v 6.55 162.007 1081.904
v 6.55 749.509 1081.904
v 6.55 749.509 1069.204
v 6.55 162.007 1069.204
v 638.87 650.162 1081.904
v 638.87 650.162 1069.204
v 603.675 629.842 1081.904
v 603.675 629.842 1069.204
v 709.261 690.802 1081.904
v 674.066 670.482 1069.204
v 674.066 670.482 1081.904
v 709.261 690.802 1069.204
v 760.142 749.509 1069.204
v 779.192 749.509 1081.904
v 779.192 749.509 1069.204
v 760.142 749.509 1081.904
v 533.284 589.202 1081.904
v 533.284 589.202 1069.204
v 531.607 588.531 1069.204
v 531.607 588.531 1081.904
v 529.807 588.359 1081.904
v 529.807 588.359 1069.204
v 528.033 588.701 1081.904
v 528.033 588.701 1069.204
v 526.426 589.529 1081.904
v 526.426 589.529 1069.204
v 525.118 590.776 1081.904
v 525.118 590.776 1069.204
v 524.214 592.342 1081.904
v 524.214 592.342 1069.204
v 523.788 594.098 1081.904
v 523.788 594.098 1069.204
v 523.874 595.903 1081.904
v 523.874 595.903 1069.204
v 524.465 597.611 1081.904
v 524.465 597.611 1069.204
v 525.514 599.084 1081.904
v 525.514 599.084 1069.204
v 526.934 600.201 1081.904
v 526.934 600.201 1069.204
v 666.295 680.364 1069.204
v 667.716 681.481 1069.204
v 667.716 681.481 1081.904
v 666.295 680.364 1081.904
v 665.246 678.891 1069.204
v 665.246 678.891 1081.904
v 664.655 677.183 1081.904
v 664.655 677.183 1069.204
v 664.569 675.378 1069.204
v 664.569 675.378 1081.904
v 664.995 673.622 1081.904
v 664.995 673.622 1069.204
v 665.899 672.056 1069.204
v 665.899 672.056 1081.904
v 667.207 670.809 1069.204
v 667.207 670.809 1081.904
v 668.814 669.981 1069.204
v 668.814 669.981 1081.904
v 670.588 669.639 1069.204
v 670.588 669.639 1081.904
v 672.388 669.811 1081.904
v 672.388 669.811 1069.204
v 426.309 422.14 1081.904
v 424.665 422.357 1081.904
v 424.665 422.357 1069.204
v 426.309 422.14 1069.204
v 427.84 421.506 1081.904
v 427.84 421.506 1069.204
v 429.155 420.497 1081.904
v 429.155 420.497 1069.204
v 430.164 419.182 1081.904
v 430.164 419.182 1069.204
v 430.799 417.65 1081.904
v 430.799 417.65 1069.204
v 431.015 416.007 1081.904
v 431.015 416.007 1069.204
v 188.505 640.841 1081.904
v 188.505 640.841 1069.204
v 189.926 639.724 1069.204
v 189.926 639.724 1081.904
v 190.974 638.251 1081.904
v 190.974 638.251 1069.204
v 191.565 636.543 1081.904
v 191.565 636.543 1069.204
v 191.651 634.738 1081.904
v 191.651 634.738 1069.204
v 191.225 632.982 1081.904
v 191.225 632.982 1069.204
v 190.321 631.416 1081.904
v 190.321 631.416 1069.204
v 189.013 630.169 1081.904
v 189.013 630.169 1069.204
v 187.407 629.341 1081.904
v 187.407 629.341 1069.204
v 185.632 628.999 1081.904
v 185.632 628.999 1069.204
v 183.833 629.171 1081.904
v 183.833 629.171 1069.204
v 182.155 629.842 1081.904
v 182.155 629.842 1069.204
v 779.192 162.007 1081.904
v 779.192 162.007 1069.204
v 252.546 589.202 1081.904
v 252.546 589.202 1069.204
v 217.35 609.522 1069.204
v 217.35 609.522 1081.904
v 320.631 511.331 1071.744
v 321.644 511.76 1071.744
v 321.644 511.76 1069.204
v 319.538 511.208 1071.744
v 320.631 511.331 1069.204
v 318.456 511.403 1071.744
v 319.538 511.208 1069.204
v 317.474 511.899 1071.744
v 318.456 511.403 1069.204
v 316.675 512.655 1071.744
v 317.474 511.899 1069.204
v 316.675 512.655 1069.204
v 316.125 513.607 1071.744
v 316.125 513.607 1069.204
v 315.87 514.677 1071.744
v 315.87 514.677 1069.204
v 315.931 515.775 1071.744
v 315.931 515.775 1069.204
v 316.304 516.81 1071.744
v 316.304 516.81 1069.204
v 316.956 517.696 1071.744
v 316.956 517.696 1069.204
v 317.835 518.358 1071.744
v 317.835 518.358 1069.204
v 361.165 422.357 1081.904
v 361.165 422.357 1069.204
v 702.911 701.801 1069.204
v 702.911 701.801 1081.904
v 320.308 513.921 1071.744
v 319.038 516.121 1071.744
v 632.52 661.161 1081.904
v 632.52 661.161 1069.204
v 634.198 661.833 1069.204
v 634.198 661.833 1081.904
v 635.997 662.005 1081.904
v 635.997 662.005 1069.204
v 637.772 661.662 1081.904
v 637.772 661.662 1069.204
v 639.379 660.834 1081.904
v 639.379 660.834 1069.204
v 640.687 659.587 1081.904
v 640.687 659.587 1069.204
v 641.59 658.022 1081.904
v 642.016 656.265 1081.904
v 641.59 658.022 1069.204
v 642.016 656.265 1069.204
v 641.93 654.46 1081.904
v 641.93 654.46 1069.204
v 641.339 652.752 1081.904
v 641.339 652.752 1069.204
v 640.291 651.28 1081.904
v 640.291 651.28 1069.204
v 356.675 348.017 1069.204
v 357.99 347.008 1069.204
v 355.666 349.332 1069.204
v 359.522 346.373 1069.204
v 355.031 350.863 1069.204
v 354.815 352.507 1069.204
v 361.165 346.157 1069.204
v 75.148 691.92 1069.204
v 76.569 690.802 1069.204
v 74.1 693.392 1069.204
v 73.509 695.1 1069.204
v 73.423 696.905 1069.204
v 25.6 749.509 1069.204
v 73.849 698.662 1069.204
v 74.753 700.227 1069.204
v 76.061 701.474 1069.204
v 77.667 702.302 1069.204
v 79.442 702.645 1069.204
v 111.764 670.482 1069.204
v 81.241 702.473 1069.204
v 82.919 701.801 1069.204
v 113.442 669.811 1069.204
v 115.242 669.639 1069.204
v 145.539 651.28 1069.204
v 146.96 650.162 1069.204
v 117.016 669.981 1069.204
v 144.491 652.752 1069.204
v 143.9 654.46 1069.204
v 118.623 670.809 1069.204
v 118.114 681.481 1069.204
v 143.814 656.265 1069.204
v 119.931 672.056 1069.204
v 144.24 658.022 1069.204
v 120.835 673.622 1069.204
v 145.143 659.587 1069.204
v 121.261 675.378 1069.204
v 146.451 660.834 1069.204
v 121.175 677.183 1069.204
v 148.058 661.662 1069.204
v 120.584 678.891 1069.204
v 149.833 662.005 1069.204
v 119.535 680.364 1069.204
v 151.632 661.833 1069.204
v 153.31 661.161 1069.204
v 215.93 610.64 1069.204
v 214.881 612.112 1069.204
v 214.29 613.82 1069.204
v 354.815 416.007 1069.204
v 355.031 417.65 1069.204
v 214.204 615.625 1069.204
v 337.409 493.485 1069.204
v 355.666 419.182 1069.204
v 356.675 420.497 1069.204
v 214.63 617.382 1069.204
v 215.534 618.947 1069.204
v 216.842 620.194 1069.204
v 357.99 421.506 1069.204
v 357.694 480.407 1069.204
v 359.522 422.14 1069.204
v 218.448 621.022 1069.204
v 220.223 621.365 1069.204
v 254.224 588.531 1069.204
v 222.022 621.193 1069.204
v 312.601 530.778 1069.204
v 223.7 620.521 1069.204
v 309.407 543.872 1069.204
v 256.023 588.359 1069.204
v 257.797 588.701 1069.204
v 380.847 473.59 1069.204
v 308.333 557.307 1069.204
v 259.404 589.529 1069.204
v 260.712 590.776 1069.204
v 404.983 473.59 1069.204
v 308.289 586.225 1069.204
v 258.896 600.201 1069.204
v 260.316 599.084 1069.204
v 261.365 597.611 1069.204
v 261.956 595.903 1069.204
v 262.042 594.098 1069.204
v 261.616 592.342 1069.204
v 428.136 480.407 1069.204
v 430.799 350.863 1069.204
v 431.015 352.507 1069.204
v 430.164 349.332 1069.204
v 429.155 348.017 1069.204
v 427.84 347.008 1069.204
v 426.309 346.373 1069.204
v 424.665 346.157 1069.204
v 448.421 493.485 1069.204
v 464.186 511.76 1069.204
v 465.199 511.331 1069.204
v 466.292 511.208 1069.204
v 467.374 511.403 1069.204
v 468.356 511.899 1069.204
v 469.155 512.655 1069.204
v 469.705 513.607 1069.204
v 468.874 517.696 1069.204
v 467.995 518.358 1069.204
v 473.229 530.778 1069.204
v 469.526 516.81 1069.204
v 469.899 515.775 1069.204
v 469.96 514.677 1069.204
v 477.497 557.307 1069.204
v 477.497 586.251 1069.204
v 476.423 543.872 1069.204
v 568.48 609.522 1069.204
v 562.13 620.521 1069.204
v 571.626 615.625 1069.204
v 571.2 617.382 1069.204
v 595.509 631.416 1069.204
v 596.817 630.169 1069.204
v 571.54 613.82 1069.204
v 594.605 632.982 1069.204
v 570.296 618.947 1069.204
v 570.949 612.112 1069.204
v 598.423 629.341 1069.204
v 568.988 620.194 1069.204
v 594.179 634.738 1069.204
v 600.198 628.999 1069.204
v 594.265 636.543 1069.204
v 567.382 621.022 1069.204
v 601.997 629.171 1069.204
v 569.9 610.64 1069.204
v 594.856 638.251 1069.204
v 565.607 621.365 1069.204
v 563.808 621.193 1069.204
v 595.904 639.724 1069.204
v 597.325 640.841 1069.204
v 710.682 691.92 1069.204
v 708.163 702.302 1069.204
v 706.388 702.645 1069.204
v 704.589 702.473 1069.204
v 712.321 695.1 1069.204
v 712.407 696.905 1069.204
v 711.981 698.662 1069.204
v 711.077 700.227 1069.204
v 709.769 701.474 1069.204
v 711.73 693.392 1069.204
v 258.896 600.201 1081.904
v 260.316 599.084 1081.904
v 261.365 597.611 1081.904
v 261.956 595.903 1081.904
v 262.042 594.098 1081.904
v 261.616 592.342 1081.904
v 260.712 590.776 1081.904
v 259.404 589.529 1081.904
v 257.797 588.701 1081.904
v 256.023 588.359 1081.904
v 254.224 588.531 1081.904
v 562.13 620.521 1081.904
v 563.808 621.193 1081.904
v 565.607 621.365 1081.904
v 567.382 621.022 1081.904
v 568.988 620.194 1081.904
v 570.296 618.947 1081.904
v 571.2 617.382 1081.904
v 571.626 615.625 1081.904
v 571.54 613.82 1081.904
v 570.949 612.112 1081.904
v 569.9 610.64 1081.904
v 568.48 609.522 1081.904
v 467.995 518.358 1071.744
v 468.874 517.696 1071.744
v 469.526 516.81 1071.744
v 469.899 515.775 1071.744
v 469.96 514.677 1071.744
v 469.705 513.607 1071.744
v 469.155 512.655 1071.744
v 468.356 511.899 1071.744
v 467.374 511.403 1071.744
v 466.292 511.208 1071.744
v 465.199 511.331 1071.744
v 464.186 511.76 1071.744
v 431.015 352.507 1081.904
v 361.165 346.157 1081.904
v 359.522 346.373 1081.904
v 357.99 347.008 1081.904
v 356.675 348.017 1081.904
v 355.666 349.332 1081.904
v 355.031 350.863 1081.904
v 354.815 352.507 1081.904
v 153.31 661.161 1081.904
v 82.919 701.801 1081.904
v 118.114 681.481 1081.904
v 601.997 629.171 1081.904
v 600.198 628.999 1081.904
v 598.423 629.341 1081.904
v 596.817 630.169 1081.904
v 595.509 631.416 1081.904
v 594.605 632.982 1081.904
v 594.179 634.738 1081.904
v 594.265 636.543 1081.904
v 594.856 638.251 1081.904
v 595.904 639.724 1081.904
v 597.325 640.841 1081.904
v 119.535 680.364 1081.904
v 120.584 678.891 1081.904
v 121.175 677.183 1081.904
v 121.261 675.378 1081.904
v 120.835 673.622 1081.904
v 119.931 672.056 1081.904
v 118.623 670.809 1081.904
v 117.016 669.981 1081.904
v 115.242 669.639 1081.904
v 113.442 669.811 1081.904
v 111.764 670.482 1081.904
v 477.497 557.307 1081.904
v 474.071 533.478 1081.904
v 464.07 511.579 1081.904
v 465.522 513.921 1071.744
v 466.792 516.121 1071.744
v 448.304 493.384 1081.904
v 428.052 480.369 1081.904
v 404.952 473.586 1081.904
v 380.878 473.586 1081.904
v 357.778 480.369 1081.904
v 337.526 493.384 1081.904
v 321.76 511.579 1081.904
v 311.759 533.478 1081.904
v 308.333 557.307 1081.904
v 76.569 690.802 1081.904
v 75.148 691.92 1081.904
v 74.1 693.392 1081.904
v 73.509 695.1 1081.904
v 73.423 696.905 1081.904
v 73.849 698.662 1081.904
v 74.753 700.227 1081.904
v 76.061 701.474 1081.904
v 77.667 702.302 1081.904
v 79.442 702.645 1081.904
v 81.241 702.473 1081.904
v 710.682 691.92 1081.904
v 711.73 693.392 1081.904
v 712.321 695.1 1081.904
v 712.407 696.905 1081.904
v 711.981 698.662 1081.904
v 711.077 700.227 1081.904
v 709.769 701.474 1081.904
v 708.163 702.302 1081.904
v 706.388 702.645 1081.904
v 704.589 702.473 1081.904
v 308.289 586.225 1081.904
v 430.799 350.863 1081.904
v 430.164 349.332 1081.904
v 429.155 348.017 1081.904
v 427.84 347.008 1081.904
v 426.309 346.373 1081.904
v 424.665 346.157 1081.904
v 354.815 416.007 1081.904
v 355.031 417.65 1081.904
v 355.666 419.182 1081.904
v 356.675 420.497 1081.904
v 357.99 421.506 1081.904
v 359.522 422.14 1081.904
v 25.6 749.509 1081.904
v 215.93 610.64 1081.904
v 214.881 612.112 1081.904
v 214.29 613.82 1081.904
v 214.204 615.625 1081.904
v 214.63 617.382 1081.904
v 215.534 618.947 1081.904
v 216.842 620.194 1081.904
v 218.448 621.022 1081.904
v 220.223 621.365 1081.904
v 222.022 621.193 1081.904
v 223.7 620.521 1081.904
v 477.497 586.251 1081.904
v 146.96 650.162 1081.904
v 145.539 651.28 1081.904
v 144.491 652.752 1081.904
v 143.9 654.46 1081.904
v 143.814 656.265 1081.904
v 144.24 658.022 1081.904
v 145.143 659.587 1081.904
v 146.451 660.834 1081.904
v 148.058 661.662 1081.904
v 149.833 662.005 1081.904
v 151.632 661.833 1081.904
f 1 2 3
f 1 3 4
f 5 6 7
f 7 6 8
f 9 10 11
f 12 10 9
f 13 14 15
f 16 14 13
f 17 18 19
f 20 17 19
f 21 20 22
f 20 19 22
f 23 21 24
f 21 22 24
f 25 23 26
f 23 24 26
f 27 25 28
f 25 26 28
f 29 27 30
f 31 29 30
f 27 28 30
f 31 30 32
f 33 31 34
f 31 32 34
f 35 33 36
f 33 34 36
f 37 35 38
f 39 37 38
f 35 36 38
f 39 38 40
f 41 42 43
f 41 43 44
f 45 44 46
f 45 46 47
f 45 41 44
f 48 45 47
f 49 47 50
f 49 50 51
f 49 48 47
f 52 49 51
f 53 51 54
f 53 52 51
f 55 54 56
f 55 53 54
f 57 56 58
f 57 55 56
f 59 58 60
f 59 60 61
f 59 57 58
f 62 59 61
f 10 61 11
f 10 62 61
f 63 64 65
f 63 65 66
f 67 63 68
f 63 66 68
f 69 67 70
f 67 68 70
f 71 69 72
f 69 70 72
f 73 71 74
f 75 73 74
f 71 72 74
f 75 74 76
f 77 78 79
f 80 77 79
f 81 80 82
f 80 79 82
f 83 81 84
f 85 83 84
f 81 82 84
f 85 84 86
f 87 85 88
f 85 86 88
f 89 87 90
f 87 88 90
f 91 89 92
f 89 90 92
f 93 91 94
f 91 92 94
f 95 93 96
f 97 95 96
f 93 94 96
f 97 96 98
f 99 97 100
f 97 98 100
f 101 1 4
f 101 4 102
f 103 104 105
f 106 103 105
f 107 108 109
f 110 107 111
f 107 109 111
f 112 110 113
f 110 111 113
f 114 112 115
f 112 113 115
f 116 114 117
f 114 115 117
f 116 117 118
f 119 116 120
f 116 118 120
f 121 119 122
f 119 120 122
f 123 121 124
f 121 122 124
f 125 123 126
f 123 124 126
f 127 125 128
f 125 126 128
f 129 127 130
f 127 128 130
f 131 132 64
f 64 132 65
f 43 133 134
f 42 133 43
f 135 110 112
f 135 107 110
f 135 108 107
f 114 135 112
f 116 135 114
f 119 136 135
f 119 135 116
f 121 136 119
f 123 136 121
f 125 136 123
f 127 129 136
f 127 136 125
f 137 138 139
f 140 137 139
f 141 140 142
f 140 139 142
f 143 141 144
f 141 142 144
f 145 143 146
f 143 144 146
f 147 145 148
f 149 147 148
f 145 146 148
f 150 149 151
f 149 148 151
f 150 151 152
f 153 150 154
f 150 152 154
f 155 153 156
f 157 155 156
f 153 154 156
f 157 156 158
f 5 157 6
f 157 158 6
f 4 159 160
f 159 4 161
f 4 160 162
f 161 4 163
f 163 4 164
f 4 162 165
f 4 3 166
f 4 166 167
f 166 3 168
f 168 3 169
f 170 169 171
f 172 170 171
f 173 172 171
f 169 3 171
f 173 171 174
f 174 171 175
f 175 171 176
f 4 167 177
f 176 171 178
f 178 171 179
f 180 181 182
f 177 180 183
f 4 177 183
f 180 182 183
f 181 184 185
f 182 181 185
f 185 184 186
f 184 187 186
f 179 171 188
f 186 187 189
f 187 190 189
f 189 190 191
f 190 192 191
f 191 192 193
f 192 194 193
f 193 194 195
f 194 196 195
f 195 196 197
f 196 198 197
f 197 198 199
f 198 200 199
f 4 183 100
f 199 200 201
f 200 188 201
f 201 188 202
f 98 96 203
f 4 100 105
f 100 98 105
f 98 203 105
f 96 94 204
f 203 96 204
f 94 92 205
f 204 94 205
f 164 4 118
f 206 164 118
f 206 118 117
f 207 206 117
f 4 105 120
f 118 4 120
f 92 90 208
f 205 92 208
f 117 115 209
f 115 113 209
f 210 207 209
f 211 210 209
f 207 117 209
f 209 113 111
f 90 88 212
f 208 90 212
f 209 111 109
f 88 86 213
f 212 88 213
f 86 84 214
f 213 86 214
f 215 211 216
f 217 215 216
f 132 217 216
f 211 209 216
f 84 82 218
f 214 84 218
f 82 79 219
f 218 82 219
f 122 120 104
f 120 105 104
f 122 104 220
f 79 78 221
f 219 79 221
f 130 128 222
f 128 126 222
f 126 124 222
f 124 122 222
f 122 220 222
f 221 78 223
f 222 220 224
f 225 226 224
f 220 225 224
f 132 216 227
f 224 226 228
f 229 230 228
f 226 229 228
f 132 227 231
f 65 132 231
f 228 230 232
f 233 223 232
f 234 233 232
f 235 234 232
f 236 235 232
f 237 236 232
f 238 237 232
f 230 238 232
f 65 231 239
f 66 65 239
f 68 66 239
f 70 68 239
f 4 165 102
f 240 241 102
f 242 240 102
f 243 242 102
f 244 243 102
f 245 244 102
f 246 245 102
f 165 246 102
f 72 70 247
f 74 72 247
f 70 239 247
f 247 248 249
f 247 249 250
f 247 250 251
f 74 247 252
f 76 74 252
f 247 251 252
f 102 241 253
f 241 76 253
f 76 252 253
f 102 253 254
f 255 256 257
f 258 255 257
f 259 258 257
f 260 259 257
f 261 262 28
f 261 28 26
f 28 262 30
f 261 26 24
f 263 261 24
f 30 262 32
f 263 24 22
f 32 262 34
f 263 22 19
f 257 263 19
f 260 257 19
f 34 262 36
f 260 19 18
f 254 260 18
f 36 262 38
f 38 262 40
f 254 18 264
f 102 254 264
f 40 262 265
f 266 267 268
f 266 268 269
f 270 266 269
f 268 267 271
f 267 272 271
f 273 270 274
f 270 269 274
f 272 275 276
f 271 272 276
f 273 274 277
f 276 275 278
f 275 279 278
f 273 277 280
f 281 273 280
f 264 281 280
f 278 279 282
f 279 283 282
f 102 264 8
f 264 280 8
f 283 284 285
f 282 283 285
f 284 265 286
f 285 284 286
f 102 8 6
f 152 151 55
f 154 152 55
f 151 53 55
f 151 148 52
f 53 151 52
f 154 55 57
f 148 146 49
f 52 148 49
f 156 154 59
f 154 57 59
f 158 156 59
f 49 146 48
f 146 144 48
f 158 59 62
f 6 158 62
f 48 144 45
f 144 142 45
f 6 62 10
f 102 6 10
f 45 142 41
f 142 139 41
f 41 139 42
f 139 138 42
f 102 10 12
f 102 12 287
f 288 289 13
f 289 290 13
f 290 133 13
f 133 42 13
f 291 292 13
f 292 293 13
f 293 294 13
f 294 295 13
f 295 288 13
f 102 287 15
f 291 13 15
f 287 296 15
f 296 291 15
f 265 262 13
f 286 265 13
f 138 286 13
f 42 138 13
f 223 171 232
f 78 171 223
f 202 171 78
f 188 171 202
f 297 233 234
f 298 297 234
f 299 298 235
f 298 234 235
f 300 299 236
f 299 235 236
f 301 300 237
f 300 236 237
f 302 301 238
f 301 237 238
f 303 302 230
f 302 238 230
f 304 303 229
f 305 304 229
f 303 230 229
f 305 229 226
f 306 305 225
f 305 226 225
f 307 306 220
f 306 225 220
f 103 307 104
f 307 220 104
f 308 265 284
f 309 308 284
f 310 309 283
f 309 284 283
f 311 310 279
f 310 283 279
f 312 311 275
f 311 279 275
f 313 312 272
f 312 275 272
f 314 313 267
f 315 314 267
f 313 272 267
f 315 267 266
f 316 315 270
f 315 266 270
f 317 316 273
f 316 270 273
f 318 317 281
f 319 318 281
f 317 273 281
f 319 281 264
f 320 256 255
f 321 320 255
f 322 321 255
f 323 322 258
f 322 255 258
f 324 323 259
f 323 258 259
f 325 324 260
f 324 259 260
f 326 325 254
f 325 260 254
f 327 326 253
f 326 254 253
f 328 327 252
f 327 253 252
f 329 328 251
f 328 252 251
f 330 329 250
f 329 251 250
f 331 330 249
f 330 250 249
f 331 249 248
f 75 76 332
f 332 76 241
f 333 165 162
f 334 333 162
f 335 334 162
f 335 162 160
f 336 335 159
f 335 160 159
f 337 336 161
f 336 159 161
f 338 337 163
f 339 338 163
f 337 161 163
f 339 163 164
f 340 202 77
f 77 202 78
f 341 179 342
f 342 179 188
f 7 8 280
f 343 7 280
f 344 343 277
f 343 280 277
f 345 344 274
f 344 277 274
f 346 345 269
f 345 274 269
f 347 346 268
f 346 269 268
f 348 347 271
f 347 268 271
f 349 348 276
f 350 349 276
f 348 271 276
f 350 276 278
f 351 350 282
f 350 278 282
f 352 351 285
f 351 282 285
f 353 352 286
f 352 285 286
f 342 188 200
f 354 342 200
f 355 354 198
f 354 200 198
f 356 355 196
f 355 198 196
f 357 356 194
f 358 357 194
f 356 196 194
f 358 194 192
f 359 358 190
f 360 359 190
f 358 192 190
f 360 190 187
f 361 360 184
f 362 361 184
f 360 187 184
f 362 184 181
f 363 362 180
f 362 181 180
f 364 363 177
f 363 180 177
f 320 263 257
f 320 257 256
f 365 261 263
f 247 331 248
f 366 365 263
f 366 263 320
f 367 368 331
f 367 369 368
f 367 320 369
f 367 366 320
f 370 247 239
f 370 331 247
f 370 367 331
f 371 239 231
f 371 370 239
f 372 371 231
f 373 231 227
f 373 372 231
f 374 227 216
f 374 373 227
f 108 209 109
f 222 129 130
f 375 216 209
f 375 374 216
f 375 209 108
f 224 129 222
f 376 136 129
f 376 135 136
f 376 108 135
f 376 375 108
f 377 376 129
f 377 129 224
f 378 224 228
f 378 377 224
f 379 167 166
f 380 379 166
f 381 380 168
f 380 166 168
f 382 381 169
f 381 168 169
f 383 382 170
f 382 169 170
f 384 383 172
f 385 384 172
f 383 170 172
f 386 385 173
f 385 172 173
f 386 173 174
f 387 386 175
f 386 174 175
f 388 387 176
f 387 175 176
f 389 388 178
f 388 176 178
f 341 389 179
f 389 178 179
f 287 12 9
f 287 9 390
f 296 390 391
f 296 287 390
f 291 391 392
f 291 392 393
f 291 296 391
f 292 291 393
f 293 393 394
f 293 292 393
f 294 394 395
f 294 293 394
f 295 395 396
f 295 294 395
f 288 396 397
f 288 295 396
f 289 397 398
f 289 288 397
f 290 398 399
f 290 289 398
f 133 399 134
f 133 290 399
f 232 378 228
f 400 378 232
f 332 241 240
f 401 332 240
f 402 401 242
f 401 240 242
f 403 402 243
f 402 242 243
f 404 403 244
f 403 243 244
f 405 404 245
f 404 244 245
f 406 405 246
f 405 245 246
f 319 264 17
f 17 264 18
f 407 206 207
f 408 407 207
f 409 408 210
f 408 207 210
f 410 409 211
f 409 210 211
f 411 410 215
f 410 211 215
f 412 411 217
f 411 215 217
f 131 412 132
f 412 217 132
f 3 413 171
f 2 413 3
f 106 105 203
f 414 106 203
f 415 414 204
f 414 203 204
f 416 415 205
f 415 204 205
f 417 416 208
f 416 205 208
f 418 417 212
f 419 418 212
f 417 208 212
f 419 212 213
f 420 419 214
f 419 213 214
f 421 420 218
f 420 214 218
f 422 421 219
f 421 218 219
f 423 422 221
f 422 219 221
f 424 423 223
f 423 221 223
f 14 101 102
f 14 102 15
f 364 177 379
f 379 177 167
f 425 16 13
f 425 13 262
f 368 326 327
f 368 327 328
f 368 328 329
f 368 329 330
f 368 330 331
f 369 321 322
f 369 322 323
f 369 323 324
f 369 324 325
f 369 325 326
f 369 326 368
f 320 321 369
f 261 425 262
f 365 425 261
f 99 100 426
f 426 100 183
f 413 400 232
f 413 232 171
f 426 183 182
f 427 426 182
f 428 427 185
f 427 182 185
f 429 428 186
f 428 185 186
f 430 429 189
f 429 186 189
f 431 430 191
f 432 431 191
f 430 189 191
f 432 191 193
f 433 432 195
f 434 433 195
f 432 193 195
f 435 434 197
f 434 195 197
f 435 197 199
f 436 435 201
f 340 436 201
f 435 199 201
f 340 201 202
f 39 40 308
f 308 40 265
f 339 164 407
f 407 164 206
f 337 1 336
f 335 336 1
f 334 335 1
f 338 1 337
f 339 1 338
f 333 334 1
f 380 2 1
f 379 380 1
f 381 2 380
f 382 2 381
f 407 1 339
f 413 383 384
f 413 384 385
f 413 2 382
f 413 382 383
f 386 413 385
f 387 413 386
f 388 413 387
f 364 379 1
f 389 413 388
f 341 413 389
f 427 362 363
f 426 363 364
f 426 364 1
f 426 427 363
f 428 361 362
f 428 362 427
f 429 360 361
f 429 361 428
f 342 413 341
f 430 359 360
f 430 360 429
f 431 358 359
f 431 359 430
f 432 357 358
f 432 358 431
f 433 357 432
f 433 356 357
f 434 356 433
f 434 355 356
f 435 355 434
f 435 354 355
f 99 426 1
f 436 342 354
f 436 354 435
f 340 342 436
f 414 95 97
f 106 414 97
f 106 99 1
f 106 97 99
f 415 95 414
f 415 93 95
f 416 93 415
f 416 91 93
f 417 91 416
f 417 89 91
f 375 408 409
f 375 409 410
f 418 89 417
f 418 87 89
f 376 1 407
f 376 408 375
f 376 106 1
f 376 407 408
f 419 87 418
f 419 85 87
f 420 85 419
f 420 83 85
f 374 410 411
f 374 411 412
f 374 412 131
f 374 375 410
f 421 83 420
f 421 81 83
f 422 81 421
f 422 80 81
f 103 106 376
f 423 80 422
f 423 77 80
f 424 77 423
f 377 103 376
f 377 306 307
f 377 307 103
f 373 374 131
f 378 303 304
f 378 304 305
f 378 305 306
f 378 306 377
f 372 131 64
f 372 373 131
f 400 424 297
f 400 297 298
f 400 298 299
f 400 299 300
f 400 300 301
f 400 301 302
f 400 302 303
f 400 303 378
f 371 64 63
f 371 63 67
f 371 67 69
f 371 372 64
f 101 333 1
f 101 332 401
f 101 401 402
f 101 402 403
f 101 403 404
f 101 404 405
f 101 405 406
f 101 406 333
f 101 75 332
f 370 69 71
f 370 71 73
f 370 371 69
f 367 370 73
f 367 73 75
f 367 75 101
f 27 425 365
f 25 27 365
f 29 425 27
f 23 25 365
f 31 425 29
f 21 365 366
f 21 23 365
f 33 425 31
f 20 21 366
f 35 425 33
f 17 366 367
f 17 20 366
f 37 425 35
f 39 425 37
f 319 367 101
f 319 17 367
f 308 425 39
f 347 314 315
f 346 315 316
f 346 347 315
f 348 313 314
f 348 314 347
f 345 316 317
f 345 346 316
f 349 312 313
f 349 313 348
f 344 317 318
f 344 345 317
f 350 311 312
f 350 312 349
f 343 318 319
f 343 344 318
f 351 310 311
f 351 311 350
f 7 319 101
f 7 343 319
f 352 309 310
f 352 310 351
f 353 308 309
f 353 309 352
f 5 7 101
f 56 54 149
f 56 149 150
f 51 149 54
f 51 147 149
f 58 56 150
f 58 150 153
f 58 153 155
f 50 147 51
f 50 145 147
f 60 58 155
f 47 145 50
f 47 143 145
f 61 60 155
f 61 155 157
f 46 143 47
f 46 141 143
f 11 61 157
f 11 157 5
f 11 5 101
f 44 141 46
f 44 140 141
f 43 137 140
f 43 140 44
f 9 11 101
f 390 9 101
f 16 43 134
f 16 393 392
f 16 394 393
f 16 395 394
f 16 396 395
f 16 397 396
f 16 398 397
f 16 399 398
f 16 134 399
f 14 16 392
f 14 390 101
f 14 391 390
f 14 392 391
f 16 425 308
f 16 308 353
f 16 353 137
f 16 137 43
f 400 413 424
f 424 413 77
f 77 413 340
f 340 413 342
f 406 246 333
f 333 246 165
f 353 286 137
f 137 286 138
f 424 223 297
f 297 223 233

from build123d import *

# Parameters (mm, degrees)
BOSS_EXTRUDE1_DEPTH = 12.7
CUT_EXTRUDE5_DEPTH  = 12.7
SKETCH9_R           = 3.81
CUT_EXTRUDE6_DEPTH  = 2.54
CUT_EXTRUDE7_DEPTH  = 12.7


with BuildPart() as part:
    # Sketch1 → Boss-Extrude1 (new body)
    with BuildSketch(Plane.XY.offset(1081.90385267)):
        with BuildLine():
            Line((779.192327096, 749.508856284), (760.142327096, 749.508856284))
            Line((760.142327096, 749.508856284), (477.497001613, 586.250864284))
            Line((477.497001613, 586.250864284), (477.497001613, 557.307056284))
            ThreePointArc((477.497001613, 557.307056284), (392.915001613, 472.725056284), (308.333001613, 557.307056284))
            Line((308.333001613, 557.307056284), (308.289027096, 586.225464284))
            Line((308.289027096, 586.225464284), (25.599727096, 749.508856284))
            Line((25.599727096, 749.508856284), (6.549727096, 749.508856284))
            Line((6.549727096, 749.508856284), (6.549727096, 162.006856284))
            Line((6.549727096, 162.006856284), (779.192327096, 162.006856284))
            Line((779.192327096, 162.006856284), (779.192327096, 749.508856284))
        make_face()
    extrude(amount=-BOSS_EXTRUDE1_DEPTH)

    # Sketch7 → Cut-Extrude5 (cut)
    with BuildSketch(Plane(origin=(0, 0, 1069.20385267), x_dir=(-1, 0, 0), z_dir=(0, 0, -1))):
        with BuildLine():
            Line((-424.665001613, 346.156856284), (-361.165001613, 346.156856284))
            ThreePointArc((-361.165001613, 346.156856284), (-356.674873552, 348.016728223), (-354.815001613, 352.506856284))
            Line((-354.815001613, 352.506856284), (-354.815001613, 416.006856284))
            ThreePointArc((-354.815001613, 416.006856284), (-356.674873552, 420.496984344), (-361.165001613, 422.356856284))
            Line((-361.165001613, 422.356856284), (-424.665001613, 422.356856284))
            ThreePointArc((-424.665001613, 422.356856284), (-429.155129673, 420.496984344), (-431.015001613, 416.006856284))
            Line((-431.015001613, 416.006856284), (-431.015001613, 352.506856284))
            ThreePointArc((-431.015001613, 352.506856284), (-429.155129673, 348.016728223), (-424.665001613, 346.156856284))
        make_face()
    extrude(amount=-CUT_EXTRUDE5_DEPTH, mode=Mode.SUBTRACT)

    # Sketch9 → Cut-Extrude6 (cut)
    with BuildSketch(Plane(origin=(0, 0, 1069.20385267), x_dir=(-1, 0, 0), z_dir=(0, 0, -1))):
        with Locations((-466.165162315, 515.016056284)):
            Circle(SKETCH9_R)
        with Locations((-319.66484091, 515.016056284)):
            Circle(SKETCH9_R)
    extrude(amount=-CUT_EXTRUDE6_DEPTH, mode=Mode.SUBTRACT)

    # Sketch10 → Cut-Extrude7 (cut)
    with BuildSketch(Plane(origin=(0, 0, 1069.20385267), x_dir=(-1, 0, 0), z_dir=(0, 0, -1))):
        with BuildLine():
            Line((-82.919210129, 701.800959598), (-118.114482539, 681.480959598))
            ThreePointArc((-118.114482539, 681.480959598), (-120.438743853, 672.806698284), (-111.764482539, 670.48243697))
            Line((-111.764482539, 670.48243697), (-76.569210129, 690.80243697))
            ThreePointArc((-76.569210129, 690.80243697), (-74.244948815, 699.476698284), (-82.919210129, 701.800959598))
        make_face()
        with BuildLine():
            Line((-702.910793096, 701.800959598), (-667.715520686, 681.480959598))
            ThreePointArc((-667.715520686, 681.480959598), (-665.391259372, 672.806698284), (-674.065520686, 670.48243697))
            Line((-674.065520686, 670.48243697), (-709.260793096, 690.80243697))
            ThreePointArc((-709.260793096, 690.80243697), (-711.58505441, 699.476698284), (-702.910793096, 701.800959598))
        make_face()
        with BuildLine():
            Line((-153.309754949, 661.160959597), (-188.505027358, 640.840959598))
            ThreePointArc((-188.505027358, 640.840959598), (-190.829288672, 632.166698284), (-182.155027358, 629.84243697))
            Line((-182.155027358, 629.84243697), (-146.959754949, 650.16243697))
            ThreePointArc((-146.959754949, 650.16243697), (-144.635493635, 658.836698283), (-153.309754949, 661.160959597))
        make_face()
        with BuildLine():
            Line((-638.870248276, 650.16243697), (-603.674975867, 629.84243697))
            ThreePointArc((-603.674975867, 629.84243697), (-595.000714553, 632.166698284), (-597.324975867, 640.840959598))
            Line((-597.324975867, 640.840959598), (-632.520248276, 661.160959598))
            ThreePointArc((-632.520248276, 661.160959598), (-641.19450959, 658.836698284), (-638.870248276, 650.16243697))
        make_face()
        with BuildLine():
            Line((-568.479703457, 609.52243697), (-533.284431047, 589.20243697))
            ThreePointArc((-533.284431047, 589.20243697), (-524.610169733, 591.526698284), (-526.934431047, 600.200959598))
            Line((-526.934431047, 600.200959598), (-562.129703457, 620.520959598))
            ThreePointArc((-562.129703457, 620.520959598), (-570.803964771, 618.196698284), (-568.479703457, 609.52243697))
        make_face()
        with BuildLine():
            Line((-223.700299768, 620.520959597), (-258.895572178, 600.200959597))
            ThreePointArc((-258.895572178, 600.200959597), (-261.219833492, 591.526698284), (-252.545572178, 589.20243697))
            Line((-252.545572178, 589.20243697), (-217.350299768, 609.52243697))
            ThreePointArc((-217.350299768, 609.52243697), (-215.026038454, 618.196698283), (-223.700299768, 620.520959597))
        make_face()
    extrude(amount=-CUT_EXTRUDE7_DEPTH, mode=Mode.SUBTRACT)


solid = part.part
